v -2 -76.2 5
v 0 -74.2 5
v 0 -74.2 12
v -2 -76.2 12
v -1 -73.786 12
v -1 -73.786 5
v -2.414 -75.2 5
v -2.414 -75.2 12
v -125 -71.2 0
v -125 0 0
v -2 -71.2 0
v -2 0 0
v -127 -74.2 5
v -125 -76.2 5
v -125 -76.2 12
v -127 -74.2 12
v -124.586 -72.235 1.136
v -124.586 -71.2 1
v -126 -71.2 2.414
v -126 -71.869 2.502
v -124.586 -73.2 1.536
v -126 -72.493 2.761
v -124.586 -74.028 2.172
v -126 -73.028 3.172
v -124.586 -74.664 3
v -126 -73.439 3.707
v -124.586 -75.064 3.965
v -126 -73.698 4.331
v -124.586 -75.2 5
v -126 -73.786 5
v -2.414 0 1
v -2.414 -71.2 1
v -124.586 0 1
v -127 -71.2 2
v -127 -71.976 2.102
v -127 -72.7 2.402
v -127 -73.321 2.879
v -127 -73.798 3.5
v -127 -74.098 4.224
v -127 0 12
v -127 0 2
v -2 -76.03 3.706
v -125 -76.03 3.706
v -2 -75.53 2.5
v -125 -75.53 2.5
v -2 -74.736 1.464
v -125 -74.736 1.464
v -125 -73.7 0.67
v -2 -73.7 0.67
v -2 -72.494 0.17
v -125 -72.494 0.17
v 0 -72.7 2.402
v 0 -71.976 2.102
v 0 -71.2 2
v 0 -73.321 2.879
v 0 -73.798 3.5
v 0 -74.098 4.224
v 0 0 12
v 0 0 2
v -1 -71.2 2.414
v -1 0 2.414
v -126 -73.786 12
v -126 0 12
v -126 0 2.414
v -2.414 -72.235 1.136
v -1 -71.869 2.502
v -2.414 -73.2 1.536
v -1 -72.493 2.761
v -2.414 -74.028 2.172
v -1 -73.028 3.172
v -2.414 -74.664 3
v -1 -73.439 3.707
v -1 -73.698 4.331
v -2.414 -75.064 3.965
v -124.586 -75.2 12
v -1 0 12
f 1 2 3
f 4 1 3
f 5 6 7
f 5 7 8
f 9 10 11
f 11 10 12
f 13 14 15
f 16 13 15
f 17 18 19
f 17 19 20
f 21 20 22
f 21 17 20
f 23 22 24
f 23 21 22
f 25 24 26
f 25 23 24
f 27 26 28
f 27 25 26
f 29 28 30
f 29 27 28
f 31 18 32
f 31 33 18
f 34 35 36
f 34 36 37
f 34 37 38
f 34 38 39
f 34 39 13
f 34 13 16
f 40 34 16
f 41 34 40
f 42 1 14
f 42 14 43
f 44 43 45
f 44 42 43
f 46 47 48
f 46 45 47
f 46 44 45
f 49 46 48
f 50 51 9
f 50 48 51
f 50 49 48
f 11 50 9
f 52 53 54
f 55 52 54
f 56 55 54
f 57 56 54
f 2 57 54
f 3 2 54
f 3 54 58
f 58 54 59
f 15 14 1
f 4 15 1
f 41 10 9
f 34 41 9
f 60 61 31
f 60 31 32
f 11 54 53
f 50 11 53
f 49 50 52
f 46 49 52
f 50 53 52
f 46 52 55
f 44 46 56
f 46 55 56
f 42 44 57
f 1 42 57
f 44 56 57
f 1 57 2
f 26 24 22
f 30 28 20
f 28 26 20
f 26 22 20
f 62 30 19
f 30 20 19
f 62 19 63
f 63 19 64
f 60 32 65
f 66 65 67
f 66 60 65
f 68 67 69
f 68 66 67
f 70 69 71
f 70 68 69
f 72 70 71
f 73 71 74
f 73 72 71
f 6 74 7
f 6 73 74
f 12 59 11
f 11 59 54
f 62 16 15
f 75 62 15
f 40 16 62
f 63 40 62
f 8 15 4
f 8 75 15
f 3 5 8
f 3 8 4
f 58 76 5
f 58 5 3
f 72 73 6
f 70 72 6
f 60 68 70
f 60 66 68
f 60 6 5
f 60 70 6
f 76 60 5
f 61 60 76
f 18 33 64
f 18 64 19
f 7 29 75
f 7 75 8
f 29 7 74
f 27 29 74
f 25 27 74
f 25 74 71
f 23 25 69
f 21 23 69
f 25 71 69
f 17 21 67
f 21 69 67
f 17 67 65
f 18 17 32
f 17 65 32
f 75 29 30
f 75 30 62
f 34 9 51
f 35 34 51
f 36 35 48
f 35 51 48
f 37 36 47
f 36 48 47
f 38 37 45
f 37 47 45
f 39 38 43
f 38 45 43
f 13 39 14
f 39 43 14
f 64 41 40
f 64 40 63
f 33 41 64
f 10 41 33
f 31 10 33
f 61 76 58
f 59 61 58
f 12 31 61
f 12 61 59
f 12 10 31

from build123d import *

# Parameters (mm, degrees)
F0_W     = 127
F0_H     = 76.2
F1_DEPTH = 12
F2_R     = 5
F3_SIZE  = 2
F4_T     = -1


with BuildPart() as f1:
    # F0 (on Top) → F1 (new body)
    with BuildSketch(Plane.XY):
        with Locations((-63.5, -38.1)):
            Rectangle(F0_W, F0_H)
    extrude(amount=F1_DEPTH)

    # F2
    f2_edges = [f1.edges().sort_by_distance(p)[0] for p in [
        (-63.5, -76.2, 0),
    ]]
    fillet(f2_edges, radius=F2_R)

    # F3
    f3_edges = [f1.edges().sort_by_distance(p)[0] for p in [
        (0, -76.2, 8.5),
        (-127, -76.2, 8.5),
    ]]
    chamfer(f3_edges, length=F3_SIZE)

    # F4
    f4_openings = [f1.faces().sort_by_distance(p)[0] for p in [
        (-63.5, -38.084521, 12),
        (-63.5, 0, 6.014035),
    ]]
    offset(amount=F4_T, openings=f4_openings)


solid = f1.part
